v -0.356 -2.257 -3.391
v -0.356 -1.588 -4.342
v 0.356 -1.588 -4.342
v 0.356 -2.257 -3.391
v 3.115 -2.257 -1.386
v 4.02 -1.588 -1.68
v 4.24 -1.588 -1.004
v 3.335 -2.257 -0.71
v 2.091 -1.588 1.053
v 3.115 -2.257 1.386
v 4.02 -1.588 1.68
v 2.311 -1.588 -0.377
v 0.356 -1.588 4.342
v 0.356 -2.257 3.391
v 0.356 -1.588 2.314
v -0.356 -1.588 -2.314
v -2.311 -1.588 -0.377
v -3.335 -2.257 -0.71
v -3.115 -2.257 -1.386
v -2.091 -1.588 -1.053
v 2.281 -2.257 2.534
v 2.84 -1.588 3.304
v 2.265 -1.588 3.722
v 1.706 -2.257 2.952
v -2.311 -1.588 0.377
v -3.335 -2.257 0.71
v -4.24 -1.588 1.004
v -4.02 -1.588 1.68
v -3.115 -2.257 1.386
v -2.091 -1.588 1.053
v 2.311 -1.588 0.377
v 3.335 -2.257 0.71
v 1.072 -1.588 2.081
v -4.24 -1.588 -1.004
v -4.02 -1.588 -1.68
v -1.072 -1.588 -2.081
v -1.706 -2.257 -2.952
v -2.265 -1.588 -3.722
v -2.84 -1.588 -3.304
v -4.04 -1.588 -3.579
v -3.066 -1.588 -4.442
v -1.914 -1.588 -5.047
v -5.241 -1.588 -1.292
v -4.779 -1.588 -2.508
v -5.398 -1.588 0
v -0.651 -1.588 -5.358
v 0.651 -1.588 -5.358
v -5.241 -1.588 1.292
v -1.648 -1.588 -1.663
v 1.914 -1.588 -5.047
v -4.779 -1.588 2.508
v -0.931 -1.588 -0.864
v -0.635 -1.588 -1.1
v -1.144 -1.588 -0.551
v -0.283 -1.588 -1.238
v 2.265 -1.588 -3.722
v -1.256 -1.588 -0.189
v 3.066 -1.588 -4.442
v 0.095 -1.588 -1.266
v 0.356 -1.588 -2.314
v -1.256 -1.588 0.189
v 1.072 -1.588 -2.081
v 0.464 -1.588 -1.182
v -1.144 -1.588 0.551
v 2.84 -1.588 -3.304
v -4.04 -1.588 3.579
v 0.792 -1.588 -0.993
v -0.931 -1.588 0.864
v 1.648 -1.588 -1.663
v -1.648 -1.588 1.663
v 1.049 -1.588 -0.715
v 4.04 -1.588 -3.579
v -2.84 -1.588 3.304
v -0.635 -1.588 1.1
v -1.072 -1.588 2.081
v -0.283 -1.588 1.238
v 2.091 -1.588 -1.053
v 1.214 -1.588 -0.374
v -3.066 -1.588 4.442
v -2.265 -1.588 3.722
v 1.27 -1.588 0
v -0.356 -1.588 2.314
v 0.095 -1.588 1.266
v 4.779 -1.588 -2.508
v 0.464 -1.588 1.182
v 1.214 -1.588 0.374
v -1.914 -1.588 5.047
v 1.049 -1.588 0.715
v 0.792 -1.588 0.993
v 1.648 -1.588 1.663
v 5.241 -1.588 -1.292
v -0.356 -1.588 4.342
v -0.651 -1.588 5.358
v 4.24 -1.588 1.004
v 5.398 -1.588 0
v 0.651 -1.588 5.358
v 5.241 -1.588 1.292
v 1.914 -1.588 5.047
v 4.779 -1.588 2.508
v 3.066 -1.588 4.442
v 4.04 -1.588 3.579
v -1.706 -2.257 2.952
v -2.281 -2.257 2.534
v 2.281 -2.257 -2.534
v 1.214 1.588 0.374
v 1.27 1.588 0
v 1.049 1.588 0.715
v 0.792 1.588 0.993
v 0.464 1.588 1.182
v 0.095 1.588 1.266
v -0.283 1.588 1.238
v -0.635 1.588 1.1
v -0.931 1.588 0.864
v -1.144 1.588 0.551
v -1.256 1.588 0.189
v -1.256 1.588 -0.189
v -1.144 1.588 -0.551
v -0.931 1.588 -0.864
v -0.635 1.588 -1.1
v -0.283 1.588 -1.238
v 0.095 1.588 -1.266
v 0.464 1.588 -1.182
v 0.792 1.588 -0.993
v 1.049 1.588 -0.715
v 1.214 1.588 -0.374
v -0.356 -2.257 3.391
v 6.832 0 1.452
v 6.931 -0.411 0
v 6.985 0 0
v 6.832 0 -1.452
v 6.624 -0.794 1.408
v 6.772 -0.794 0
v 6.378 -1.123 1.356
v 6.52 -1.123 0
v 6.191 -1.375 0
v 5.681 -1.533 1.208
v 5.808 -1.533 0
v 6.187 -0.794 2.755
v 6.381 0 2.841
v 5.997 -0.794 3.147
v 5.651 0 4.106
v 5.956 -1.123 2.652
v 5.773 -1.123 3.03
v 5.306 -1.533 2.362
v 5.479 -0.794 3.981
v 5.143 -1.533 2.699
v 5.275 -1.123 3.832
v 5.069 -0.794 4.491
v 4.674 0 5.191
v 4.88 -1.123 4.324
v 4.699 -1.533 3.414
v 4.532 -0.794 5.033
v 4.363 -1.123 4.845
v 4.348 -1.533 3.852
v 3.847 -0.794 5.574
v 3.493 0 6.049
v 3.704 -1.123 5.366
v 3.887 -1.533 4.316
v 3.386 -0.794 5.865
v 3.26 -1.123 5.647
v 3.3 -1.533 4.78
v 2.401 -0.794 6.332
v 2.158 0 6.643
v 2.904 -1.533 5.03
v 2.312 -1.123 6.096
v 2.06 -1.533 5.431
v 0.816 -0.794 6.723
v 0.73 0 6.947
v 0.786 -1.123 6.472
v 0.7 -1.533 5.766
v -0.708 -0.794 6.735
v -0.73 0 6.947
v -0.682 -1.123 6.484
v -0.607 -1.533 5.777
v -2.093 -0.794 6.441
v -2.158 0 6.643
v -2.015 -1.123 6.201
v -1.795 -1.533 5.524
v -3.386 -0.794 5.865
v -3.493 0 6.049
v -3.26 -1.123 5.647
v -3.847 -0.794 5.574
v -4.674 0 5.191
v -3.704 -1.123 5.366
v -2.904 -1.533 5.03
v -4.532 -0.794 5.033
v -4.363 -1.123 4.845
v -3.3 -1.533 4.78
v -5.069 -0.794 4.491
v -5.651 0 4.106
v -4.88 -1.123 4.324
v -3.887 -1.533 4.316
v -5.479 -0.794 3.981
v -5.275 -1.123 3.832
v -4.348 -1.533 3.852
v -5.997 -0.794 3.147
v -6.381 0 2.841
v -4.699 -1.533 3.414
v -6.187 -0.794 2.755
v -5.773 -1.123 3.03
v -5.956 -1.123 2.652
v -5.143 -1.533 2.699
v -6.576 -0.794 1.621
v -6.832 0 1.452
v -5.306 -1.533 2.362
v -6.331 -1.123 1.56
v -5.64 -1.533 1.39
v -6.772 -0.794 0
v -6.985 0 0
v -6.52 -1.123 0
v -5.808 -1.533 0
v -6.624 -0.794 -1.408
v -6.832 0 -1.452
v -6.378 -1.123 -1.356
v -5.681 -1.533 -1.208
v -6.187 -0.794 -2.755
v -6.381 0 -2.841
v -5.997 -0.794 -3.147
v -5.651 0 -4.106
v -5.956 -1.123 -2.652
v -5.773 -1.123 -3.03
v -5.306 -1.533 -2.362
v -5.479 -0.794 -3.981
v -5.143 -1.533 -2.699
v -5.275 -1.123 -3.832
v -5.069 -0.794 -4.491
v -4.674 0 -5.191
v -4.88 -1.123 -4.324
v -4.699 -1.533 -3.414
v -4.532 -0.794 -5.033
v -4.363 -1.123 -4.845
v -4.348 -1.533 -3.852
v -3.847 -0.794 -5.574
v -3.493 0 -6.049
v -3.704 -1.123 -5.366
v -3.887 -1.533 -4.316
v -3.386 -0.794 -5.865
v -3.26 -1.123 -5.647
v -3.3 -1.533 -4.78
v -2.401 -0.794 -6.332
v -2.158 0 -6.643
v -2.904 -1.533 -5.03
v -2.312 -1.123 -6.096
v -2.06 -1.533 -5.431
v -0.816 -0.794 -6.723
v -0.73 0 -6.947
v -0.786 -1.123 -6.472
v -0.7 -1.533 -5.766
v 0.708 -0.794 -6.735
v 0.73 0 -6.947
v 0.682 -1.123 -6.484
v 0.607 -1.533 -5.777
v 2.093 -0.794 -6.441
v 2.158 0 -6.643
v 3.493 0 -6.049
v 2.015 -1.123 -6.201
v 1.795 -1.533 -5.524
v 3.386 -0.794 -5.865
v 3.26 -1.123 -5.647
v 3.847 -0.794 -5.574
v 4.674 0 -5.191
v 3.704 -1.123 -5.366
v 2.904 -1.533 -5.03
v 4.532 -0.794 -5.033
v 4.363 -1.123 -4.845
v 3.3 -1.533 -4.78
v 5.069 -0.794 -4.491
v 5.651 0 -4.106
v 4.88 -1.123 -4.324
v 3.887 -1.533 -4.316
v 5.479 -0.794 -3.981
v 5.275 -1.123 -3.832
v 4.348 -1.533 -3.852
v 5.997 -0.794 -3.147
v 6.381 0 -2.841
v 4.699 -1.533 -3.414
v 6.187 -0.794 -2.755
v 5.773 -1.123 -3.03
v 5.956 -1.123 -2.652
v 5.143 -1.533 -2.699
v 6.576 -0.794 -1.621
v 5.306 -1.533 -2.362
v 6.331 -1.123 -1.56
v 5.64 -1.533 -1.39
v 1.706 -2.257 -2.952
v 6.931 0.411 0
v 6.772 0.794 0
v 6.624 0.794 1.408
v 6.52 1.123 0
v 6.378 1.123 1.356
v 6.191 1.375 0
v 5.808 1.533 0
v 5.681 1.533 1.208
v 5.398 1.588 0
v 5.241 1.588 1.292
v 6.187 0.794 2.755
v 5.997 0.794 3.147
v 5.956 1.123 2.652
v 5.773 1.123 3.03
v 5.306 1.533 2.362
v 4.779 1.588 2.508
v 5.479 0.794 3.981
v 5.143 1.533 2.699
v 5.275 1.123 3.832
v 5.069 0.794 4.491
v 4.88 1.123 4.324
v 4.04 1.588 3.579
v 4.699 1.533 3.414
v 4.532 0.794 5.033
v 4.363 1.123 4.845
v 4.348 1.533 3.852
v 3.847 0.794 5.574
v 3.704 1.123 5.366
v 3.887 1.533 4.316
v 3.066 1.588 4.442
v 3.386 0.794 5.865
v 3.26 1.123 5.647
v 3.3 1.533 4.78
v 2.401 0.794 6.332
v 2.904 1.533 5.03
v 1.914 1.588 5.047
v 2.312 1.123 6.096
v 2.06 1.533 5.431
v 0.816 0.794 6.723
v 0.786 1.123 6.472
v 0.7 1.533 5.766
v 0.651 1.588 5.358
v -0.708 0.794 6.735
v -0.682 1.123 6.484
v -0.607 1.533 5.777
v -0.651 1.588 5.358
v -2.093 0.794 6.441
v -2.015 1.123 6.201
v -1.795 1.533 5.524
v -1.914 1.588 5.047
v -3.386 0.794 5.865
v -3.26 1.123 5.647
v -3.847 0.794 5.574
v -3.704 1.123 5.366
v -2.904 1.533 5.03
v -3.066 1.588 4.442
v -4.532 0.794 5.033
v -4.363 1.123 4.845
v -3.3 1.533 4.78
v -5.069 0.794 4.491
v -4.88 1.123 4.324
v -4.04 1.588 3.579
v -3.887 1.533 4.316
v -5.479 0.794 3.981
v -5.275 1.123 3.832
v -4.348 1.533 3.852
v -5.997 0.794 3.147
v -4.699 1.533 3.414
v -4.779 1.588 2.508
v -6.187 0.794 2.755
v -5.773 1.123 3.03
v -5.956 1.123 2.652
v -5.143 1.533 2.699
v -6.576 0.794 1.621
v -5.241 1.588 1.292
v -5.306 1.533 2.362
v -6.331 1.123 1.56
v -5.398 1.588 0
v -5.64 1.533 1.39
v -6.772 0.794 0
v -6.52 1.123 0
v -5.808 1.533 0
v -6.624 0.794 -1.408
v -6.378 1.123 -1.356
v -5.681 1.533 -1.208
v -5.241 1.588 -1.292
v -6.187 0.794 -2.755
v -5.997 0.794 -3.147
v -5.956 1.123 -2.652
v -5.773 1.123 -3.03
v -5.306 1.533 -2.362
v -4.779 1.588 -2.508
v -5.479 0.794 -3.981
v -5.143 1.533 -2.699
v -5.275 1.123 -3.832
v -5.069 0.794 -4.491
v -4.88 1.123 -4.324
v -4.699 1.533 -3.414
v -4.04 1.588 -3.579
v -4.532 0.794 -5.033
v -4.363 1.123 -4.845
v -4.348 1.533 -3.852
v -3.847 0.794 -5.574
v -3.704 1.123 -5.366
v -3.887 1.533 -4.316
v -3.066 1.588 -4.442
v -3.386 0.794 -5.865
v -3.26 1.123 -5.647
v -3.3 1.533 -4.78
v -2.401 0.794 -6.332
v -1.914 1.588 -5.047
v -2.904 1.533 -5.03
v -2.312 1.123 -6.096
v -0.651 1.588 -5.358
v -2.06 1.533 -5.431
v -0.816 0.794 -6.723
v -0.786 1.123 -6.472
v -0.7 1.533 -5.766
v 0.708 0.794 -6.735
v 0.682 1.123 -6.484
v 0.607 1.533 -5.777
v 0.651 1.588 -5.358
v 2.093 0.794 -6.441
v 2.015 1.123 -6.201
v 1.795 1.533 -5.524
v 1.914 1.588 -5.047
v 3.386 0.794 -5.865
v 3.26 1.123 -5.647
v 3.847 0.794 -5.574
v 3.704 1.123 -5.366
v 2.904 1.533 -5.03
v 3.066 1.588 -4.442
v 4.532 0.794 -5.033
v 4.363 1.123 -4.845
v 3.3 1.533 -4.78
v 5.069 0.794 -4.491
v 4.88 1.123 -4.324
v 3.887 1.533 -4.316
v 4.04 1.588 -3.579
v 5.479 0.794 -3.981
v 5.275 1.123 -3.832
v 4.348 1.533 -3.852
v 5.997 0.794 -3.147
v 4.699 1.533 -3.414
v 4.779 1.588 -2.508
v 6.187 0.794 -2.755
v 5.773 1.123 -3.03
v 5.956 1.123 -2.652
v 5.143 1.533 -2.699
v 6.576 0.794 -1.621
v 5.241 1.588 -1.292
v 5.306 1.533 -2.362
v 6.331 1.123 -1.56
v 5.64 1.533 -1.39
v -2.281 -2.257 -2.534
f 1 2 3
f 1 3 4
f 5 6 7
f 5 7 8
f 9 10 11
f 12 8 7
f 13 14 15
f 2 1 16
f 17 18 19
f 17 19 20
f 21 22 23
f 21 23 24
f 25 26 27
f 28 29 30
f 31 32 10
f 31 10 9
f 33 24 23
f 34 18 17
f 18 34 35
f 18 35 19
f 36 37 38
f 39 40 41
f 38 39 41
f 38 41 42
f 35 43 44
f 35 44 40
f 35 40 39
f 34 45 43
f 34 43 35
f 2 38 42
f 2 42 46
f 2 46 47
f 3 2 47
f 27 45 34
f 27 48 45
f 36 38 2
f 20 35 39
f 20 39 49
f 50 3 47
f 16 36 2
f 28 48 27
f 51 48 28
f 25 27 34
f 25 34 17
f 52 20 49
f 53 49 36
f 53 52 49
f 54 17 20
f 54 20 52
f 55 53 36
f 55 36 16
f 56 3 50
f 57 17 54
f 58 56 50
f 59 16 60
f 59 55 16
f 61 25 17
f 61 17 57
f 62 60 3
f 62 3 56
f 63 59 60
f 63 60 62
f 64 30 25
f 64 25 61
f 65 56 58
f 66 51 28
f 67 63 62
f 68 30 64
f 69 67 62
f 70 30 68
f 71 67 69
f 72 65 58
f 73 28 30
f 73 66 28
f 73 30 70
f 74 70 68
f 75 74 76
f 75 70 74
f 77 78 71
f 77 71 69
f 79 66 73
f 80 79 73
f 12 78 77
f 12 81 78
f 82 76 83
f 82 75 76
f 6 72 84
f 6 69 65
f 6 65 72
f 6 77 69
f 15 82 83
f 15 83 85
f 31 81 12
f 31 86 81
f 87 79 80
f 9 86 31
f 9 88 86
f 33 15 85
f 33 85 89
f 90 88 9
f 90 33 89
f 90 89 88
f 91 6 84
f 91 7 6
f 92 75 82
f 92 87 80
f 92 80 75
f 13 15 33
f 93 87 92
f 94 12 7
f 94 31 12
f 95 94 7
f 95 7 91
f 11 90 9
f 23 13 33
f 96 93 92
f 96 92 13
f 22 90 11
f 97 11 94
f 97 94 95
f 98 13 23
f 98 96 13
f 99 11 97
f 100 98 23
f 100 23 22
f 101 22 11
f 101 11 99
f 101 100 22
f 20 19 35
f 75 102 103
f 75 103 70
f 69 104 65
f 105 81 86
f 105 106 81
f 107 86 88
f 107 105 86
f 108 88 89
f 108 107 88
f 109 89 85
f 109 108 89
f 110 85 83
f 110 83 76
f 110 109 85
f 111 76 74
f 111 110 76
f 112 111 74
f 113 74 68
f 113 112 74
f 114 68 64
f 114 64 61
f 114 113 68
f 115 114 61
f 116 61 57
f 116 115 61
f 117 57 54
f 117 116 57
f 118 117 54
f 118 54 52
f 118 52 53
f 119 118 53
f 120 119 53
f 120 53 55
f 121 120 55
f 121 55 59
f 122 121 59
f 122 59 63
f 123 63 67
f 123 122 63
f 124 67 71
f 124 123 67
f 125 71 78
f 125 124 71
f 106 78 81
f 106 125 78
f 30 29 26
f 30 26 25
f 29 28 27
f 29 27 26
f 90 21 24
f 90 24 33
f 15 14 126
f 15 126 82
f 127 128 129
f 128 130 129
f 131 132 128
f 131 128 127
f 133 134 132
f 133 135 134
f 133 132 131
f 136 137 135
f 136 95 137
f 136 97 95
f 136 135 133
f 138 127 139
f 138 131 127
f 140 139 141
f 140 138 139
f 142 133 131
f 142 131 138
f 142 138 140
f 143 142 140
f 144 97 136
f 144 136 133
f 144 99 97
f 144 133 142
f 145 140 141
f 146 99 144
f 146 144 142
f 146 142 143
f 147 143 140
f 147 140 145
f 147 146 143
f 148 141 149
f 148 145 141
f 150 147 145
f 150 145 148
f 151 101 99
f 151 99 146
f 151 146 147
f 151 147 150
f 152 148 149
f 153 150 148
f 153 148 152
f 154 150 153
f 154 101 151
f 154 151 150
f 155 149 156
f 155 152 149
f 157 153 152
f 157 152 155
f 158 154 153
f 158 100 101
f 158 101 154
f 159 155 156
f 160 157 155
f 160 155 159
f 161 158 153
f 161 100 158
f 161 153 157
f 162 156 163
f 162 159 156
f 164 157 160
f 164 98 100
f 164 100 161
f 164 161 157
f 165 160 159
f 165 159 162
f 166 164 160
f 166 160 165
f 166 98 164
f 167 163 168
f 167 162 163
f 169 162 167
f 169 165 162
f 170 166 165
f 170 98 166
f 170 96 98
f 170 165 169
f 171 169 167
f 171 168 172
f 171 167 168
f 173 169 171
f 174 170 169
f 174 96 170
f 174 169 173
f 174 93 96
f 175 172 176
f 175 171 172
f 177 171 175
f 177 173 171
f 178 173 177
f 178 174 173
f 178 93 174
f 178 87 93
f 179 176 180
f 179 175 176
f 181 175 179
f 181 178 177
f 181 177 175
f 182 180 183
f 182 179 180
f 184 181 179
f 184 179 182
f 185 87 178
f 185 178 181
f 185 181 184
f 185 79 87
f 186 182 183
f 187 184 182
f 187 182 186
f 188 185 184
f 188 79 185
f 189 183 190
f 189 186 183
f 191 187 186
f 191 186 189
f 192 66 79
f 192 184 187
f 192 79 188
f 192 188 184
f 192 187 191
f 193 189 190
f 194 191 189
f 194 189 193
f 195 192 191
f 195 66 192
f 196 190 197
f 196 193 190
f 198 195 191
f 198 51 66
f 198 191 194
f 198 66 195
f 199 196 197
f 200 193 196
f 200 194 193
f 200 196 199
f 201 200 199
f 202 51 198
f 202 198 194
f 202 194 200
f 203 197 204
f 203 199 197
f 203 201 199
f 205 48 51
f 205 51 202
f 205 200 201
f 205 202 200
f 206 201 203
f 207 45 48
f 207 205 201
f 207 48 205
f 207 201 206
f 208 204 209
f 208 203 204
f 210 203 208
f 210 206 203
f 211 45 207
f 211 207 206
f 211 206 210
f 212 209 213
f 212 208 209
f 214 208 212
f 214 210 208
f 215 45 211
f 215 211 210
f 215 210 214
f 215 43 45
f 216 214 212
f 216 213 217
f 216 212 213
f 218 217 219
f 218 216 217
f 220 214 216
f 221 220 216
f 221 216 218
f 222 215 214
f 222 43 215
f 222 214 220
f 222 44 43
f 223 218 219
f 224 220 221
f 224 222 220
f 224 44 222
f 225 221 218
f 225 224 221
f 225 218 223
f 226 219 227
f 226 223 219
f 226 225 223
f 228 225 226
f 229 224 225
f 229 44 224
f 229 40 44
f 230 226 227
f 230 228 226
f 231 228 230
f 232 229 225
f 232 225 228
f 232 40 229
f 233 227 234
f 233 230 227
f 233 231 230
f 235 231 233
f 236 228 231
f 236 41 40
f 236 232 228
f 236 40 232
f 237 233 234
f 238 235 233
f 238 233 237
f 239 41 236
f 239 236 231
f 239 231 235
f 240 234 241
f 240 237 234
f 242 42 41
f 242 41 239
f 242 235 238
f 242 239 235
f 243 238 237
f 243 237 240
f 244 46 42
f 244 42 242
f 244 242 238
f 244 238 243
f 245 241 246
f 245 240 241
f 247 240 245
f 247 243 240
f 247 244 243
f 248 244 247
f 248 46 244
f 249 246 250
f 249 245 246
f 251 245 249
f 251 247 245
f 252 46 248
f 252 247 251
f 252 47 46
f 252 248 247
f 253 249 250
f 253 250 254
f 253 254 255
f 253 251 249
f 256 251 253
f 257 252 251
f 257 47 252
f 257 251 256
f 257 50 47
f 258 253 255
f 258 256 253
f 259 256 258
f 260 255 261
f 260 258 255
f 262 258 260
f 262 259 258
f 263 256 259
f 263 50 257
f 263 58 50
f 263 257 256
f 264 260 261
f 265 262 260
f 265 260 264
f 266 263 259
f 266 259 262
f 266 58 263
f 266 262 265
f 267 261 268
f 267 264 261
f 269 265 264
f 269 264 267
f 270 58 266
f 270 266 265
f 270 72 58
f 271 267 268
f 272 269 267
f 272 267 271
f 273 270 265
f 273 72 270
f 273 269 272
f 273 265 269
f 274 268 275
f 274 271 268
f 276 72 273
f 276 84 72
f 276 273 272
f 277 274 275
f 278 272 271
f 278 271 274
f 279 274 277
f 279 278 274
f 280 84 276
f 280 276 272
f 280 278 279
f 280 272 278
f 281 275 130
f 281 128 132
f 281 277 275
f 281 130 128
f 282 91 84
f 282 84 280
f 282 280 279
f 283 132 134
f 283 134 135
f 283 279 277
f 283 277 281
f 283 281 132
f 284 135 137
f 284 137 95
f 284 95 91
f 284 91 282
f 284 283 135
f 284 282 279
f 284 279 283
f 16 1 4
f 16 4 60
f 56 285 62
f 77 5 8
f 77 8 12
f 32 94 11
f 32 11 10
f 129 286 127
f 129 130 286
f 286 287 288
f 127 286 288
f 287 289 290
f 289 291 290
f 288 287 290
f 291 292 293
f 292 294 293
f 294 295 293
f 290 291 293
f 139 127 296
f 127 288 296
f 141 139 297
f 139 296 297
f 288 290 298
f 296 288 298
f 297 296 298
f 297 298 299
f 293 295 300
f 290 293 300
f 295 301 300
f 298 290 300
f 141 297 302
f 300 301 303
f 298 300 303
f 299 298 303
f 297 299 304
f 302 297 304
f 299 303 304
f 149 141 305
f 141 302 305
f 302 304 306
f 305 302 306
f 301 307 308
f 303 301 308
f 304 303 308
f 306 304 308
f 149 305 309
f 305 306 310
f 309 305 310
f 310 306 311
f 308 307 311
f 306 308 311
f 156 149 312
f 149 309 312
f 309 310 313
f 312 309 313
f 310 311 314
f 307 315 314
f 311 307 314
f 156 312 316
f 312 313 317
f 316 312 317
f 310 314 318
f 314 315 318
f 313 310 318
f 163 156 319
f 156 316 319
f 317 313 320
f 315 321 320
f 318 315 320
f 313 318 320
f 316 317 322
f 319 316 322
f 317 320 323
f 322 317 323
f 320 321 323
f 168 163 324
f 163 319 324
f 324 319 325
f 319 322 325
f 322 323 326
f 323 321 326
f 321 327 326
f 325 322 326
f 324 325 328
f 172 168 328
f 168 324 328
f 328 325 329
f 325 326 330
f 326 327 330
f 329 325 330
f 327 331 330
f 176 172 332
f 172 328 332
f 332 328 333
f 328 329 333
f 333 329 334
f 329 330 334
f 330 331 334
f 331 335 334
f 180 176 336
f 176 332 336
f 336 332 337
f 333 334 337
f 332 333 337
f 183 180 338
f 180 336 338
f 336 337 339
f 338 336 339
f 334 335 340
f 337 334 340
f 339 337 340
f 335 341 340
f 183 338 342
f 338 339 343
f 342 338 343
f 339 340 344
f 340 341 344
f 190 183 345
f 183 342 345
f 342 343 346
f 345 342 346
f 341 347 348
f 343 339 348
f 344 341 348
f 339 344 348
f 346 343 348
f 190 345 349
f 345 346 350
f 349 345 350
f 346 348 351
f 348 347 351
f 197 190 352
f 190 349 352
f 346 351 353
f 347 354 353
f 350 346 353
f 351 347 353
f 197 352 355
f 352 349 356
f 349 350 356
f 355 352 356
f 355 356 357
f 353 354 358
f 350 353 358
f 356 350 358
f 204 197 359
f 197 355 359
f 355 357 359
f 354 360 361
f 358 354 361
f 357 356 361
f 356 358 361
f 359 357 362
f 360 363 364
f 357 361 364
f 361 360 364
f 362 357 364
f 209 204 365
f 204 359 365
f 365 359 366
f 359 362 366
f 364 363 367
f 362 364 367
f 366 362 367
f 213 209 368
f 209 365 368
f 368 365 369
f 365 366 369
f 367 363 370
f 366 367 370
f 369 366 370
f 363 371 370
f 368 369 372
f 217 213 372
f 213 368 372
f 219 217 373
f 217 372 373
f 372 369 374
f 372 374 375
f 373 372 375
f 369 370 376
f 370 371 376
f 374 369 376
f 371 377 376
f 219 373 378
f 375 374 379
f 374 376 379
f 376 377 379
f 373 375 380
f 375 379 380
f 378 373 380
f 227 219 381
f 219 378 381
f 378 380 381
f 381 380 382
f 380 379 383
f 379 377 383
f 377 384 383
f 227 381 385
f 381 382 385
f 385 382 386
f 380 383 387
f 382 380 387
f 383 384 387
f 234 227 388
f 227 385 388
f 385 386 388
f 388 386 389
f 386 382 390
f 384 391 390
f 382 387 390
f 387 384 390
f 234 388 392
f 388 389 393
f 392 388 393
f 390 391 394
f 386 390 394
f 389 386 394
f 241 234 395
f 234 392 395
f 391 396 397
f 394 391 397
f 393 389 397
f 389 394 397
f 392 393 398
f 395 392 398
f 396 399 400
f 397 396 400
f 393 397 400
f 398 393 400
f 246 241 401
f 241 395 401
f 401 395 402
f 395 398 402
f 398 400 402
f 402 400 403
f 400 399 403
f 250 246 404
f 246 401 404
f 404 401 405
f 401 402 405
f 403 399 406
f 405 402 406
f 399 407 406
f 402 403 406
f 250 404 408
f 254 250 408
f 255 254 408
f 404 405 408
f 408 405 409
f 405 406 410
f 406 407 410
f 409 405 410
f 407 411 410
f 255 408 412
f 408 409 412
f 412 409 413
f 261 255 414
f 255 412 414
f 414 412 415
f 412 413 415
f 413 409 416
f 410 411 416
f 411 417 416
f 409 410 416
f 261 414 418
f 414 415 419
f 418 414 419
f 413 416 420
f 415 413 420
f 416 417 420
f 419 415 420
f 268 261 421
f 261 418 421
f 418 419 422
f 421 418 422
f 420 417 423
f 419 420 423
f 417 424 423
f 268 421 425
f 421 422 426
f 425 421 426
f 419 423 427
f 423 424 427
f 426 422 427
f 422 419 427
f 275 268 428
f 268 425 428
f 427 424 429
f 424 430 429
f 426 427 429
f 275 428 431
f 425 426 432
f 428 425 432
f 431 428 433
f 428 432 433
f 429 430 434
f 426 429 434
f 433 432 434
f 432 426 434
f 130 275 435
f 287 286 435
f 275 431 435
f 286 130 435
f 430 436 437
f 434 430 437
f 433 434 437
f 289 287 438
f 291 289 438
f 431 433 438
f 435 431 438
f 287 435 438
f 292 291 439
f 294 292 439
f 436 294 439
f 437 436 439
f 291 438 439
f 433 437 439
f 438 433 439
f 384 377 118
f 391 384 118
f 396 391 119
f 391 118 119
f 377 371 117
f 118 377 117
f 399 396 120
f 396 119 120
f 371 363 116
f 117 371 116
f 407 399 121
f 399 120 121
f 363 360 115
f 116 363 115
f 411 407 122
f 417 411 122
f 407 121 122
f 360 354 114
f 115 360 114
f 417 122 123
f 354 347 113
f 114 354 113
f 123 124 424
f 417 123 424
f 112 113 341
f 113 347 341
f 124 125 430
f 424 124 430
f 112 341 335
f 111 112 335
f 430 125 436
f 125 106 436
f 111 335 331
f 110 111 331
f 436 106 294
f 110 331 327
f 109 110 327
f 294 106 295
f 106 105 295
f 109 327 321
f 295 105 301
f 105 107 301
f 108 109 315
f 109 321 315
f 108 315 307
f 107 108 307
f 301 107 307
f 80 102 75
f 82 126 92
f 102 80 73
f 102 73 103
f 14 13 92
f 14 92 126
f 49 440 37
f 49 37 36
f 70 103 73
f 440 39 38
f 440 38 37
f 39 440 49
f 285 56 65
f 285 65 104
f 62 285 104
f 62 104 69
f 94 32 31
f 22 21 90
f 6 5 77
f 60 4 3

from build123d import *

# Parameters (mm, degrees)
F0_R     = 6.985
F0_R_2   = 1.27
F1_DEPTH = 1.5875
F2_R     = 1.58749
F4_DEPTH = 0.3556
F5_COUNT = 10


# Not quite as in the source:
# - a fillet or chamfer is up to 0.001 mm smaller than in the source, because OpenCascade refuses the exact size


with BuildPart() as f1:
    # F0 (on Front) → F1 (new body, symmetric)
    with BuildSketch(Plane.XZ):
        Circle(F0_R)
        Circle(F0_R_2, mode=Mode.SUBTRACT)
    extrude(amount=F1_DEPTH, both=True)

    # F2 (radius 1.5875 in the source; OpenCascade refuses exactly that, so slightly less here)
    f2_edges = [f1.edges().sort_by_distance(p)[0] for p in [
        (-6.985, 1.5875, 0),
        (-6.985, -1.5875, 0),
    ]]
    fillet(f2_edges, radius=F2_R)

    # F3 (on Right) → F4 (join, symmetric)
    with BuildSketch(Plane.YZ):
        Polygon((-1.5832948266, 2.3071307223), (-1.4941976026, 4.4750159141), (-2.2568043449, 3.3910733182), align=None)
    f4 = extrude(amount=F4_DEPTH, both=True)

    # F5: F4 ×10 about axis
    f5_axis = Axis((0, -1.5875, 0), (0, -1, 0))
    for i in range(1, F5_COUNT):
        add(f4.rotate(f5_axis, i * 360 / F5_COUNT))


solid = f1.part
